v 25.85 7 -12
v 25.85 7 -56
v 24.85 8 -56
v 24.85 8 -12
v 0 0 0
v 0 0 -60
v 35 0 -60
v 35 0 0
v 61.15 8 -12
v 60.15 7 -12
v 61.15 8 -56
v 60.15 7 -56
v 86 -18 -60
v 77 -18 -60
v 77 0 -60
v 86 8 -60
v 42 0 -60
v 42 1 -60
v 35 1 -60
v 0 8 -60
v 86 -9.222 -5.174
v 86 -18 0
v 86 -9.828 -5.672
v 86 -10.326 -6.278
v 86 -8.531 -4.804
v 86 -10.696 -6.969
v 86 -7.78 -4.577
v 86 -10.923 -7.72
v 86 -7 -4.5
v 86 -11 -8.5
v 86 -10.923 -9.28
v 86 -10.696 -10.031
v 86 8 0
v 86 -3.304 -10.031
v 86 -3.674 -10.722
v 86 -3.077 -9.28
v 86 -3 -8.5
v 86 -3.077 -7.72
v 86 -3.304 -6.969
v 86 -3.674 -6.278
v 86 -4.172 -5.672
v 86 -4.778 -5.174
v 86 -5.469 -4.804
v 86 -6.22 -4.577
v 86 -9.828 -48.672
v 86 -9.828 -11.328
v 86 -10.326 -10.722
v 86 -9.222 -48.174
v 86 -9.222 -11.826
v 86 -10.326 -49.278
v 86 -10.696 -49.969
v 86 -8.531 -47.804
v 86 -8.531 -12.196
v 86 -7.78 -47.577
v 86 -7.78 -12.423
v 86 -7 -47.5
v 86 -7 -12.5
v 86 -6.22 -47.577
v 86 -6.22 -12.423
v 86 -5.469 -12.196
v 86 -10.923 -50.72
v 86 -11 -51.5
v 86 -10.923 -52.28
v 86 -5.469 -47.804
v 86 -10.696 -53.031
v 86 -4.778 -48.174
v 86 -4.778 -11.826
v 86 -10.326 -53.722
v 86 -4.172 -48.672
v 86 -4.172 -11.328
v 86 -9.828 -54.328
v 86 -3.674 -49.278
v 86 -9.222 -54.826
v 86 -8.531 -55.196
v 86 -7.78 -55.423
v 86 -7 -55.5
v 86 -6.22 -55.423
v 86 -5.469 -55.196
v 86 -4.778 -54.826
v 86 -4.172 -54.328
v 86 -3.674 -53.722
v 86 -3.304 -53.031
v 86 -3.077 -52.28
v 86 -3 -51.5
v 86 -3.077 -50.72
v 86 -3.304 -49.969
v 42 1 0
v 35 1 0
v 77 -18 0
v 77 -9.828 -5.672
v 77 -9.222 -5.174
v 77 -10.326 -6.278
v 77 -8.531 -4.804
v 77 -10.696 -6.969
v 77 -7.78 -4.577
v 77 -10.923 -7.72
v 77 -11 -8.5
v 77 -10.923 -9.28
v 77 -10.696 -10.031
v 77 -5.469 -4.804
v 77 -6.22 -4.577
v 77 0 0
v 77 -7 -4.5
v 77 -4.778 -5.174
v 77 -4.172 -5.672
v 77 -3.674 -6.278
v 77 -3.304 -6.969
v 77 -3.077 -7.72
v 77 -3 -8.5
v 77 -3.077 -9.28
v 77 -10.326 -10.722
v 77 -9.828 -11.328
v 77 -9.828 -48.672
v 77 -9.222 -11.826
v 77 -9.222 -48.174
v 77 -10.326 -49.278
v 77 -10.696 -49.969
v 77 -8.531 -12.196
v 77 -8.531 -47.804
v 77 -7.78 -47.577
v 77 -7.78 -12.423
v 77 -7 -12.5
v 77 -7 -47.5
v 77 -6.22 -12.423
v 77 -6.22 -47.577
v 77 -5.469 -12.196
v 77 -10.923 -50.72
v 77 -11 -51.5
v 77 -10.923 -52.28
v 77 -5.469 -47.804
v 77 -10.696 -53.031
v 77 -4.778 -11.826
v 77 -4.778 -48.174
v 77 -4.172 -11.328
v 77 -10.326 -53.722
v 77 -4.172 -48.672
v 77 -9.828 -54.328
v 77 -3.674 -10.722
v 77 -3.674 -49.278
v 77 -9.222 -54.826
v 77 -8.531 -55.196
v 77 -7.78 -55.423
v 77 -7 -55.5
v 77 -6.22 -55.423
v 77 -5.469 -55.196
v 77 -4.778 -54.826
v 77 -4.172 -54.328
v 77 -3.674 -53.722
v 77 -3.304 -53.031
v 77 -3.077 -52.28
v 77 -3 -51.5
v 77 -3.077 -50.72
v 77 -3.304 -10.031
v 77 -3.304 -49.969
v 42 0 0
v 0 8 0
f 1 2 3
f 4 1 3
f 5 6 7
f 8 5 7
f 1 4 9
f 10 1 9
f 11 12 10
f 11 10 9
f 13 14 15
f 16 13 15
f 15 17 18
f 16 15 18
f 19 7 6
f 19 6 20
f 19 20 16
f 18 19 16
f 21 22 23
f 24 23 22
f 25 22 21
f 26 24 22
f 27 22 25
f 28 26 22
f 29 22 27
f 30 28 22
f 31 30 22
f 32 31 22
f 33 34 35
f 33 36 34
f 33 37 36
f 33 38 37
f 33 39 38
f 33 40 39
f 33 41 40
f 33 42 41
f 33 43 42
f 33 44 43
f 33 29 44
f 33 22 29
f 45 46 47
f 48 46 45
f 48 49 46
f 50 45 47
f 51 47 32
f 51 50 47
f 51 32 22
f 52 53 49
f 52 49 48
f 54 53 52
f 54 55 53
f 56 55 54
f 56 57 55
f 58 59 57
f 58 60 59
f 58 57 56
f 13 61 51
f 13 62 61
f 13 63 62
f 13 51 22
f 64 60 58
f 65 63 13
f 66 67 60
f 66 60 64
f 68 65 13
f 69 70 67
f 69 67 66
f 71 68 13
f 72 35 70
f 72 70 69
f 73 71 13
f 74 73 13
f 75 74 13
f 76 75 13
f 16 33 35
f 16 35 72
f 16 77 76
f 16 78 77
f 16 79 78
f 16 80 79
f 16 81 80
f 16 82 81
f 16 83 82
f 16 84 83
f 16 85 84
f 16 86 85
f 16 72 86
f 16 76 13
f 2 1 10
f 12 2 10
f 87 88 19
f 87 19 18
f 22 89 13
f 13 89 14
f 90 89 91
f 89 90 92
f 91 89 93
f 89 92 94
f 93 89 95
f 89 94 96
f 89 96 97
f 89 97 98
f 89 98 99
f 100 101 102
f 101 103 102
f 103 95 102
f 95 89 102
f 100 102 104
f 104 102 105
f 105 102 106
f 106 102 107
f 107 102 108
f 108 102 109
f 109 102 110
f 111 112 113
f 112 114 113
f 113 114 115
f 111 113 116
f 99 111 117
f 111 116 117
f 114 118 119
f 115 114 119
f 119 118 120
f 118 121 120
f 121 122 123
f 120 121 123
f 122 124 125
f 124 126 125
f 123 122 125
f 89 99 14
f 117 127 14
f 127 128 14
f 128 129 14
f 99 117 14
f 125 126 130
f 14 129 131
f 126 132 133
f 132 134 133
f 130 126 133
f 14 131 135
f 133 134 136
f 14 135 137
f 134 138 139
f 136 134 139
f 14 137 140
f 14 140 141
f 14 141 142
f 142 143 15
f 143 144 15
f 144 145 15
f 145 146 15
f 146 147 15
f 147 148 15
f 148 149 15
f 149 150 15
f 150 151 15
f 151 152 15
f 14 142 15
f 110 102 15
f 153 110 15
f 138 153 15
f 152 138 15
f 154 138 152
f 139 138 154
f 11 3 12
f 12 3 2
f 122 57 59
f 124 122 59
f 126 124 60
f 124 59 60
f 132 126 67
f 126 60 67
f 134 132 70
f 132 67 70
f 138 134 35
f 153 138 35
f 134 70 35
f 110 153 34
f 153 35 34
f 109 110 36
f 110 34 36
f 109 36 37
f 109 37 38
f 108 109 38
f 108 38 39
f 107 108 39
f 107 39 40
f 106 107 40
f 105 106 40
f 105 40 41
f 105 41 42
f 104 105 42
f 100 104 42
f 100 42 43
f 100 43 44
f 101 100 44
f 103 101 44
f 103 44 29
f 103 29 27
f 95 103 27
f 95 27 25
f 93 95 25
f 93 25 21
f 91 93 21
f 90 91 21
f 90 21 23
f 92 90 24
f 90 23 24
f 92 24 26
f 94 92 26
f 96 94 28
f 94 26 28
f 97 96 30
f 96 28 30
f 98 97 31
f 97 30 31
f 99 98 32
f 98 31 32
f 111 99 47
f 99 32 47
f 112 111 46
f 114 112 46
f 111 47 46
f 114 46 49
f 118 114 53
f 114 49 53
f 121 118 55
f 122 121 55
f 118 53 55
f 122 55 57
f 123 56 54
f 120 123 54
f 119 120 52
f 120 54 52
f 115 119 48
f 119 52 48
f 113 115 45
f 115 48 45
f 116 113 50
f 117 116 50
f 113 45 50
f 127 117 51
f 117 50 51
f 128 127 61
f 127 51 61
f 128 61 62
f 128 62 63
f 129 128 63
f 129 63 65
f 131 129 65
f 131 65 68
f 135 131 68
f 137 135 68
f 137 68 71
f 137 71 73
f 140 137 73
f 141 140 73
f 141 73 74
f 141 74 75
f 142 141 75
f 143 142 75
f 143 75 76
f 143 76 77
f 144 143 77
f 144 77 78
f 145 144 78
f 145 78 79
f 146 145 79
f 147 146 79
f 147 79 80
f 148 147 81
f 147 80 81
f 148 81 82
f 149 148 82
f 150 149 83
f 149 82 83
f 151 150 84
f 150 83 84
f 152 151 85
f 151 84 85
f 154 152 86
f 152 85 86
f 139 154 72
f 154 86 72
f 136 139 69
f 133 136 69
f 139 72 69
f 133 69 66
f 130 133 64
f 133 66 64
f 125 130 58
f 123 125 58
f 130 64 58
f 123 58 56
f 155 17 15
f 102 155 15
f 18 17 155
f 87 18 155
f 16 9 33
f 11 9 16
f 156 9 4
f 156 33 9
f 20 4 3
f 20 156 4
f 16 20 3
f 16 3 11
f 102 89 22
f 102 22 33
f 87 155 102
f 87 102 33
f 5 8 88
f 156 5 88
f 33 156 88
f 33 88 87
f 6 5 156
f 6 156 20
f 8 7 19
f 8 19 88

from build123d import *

# Parameters (mm, degrees)
SKETCH1_W               = 77
SKETCH1_H               = 60
BOSS_EXTRUDE1_DEPTH     = 8
SKETCH3_W               = 60
SKETCH3_H               = 26
BOSS_EXTRUDE2_DEPTH     = 9
SKETCH4_R               = 4
CUT_EXTRUDE2_DEPTH      = 107.395488626
SKETCH5_W               = 34.3
SKETCH5_H               = 44
RECESS_DEPTH            = 1
ANGLES_IN_RECESS_DEPTH  = 44
SKETCH7_W               = 7
SKETCH7_H               = 60
WHERE_THE_BELT_GO_DEPTH = 1


with BuildPart() as part:
    # Sketch1 → Boss-Extrude1 (new body)
    with BuildSketch(Plane(origin=(0, 0, 0), x_dir=(1, 0, 0), z_dir=(0, 1, 0))):
        with Locations((38.5, 30)):
            Rectangle(SKETCH1_W, SKETCH1_H)
    extrude(amount=BOSS_EXTRUDE1_DEPTH)

    # Sketch3 → Boss-Extrude2 (add)
    with BuildSketch(Plane(origin=(77, 0, 0), x_dir=(0, 0, -1), z_dir=(1, 0, 0))):
        with Locations((30, -5)):
            Rectangle(SKETCH3_W, SKETCH3_H)
    extrude(amount=BOSS_EXTRUDE2_DEPTH)

    # Sketch4 → Cut-Extrude2 (cut, through all)
    with BuildSketch(Plane(origin=(86, 0, 0), x_dir=(0, 0, -1), z_dir=(1, 0, 0))):
        with Locations((8.5, -7)):
            Circle(SKETCH4_R)
        with Locations(Location((51.5, -7, 0), (0, 0, 180))):
            Circle(SKETCH4_R)
    extrude(amount=-CUT_EXTRUDE2_DEPTH, mode=Mode.SUBTRACT)

    # Sketch5 → recess (cut)
    with BuildSketch(Plane(origin=(0, 8, 0), x_dir=(1, 0, 0), z_dir=(0, 1, 0))):
        with Locations((43, 34)):
            Rectangle(SKETCH5_W, SKETCH5_H)
    extrude(amount=-RECESS_DEPTH, mode=Mode.SUBTRACT)

    # Sketch6 → Angles in recess (cut)
    with BuildSketch(Plane.XY.offset(-56)):
        Polygon((25.85, 7), (24.85, 8), (25.85, 8), align=None)
        Polygon((60.15, 8), (60.15, 7), (61.15, 8), align=None)
    extrude(amount=ANGLES_IN_RECESS_DEPTH, mode=Mode.SUBTRACT)

    # Sketch7 → where the belt go (cut)
    with BuildSketch(Plane.XZ):
        with Locations((38.5, -30)):
            Rectangle(SKETCH7_W, SKETCH7_H)
    extrude(amount=-WHERE_THE_BELT_GO_DEPTH, mode=Mode.SUBTRACT)


solid = part.part
